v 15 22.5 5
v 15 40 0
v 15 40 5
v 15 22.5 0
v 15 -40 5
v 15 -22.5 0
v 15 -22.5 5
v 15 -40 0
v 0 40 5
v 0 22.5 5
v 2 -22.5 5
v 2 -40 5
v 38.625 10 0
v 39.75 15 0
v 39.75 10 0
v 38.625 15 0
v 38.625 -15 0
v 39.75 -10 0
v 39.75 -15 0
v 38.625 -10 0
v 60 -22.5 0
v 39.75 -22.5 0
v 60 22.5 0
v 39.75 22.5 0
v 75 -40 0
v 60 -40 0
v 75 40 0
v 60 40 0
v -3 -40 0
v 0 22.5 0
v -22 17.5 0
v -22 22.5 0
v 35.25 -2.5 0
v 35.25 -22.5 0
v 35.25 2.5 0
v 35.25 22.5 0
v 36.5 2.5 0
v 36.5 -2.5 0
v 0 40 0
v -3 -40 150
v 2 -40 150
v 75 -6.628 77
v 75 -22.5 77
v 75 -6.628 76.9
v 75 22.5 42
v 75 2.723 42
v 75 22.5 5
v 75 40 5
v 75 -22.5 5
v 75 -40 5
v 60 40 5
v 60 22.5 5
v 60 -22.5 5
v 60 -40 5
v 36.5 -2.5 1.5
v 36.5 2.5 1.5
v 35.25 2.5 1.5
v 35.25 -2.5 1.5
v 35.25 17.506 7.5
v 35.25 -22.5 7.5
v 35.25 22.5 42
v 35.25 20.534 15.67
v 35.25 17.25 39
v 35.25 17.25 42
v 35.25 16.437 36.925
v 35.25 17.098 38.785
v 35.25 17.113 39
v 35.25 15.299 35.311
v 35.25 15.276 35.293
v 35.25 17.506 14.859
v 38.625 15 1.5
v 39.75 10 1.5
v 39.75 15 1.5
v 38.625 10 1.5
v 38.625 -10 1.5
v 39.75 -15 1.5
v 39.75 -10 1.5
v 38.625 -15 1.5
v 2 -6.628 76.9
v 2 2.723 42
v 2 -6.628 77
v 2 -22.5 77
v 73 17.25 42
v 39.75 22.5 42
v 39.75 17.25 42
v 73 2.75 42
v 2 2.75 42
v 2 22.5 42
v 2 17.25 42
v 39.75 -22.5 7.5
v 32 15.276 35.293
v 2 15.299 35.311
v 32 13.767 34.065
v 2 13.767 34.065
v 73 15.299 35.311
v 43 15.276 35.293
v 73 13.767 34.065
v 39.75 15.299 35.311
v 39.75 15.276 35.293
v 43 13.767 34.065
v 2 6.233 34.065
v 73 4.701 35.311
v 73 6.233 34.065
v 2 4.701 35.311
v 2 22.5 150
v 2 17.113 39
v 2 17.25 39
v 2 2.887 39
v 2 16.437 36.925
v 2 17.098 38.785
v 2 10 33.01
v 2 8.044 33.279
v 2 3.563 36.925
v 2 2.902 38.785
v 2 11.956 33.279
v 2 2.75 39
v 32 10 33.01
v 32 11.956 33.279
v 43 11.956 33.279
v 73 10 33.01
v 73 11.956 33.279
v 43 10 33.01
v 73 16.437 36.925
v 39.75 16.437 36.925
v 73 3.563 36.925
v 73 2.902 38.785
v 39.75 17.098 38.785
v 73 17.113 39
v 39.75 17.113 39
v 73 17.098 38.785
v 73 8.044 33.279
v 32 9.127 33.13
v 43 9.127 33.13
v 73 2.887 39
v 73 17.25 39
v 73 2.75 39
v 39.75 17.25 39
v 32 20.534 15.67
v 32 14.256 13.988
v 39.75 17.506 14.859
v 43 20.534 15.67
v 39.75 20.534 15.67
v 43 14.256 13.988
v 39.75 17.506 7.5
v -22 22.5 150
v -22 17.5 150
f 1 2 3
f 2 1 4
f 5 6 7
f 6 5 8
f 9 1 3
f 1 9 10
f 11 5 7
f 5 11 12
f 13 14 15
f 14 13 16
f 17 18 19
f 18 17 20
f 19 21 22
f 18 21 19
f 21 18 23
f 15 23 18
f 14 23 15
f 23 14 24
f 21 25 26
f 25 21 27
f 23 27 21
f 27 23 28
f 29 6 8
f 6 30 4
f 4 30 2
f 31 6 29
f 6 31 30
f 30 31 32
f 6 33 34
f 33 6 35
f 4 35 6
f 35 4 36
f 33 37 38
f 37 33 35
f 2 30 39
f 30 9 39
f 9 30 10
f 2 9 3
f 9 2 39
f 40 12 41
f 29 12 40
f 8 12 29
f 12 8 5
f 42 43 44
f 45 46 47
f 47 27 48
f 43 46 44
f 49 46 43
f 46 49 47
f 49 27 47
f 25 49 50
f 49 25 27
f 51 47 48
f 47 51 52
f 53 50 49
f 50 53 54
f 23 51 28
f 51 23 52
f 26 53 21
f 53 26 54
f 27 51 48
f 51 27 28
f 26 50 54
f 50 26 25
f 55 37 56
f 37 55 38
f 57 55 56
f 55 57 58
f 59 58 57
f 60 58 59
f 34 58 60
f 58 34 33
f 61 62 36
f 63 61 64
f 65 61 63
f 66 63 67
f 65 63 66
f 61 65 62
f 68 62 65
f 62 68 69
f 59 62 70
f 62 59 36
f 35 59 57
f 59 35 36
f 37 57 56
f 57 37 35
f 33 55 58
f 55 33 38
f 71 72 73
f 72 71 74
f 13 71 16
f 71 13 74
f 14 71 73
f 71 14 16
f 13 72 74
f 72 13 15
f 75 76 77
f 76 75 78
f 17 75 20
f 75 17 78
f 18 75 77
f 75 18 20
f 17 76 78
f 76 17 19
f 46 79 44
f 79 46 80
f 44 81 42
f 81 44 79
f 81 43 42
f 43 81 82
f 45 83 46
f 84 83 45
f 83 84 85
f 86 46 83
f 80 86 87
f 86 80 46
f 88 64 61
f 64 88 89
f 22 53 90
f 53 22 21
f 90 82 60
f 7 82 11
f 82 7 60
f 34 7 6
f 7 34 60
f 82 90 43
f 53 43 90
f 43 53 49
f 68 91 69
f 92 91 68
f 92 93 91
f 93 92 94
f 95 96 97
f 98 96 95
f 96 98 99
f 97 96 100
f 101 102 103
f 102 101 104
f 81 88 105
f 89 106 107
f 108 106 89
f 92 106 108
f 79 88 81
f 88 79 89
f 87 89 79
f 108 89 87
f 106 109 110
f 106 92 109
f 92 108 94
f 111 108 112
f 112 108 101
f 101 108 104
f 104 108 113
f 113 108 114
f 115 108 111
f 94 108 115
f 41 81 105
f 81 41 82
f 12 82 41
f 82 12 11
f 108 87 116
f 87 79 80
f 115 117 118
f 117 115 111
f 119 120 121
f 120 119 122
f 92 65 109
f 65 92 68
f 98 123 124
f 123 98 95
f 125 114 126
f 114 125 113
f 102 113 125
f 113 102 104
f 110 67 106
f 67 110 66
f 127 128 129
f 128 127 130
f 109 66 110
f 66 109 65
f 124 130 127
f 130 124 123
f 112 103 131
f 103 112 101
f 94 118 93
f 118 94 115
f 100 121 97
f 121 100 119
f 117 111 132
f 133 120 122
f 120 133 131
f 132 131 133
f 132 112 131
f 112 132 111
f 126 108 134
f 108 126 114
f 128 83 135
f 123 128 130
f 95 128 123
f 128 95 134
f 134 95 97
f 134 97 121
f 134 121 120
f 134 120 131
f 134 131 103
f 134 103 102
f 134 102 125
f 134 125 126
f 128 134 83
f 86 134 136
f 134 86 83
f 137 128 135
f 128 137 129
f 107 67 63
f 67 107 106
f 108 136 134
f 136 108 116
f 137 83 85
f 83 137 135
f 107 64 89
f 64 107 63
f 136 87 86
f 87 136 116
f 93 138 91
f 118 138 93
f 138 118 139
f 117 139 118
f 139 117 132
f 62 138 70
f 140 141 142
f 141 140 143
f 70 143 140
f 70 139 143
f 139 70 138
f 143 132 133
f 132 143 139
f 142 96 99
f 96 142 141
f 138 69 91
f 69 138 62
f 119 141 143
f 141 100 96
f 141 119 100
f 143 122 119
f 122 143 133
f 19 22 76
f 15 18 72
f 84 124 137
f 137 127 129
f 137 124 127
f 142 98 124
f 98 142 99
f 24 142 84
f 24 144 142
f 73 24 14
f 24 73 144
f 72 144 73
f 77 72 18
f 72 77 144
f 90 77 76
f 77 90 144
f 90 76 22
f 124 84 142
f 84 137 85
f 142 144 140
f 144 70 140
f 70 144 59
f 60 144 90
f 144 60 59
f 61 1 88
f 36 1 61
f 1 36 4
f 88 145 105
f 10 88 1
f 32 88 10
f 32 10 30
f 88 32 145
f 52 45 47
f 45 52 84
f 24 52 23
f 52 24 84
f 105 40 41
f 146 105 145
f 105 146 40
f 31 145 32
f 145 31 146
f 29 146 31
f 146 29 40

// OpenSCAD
// include landscape mount
include_horizontal=1; // [0,1]

//width of phone connector
w_usb = 11;
//depth of phone connector
d_usb = 6.5;
//length of phone connector
l_usb=29;

//height of tilted back
h_back = 35;
//angle of tilt
th_back = 15; // [10:25]

//width of phone
w_phone = 71;

//depth of phone
d_phone = 14.5;

dock_offset=10;
d_mount = 45;
h_mount = 42;

//width of wire
w_wire = 4.5;
l_feet=80;

h_horiz=150;

// calculated values (do not edit)

w_mount = w_phone + 4;
pos_back = h_back/tan(90-th_back);
y_usb = sin(th_back)*l_usb;
z_usb = l_usb-cos(th_back)*l_usb;
//


feet();
wire_clips();
upper_back();

difference() {
translate([0,-d_mount/2,0]) cube([w_mount,d_mount,h_mount]);
translate([0,dock_offset,0]) {
dock_cutout();
wire_slot();
}
}

if (include_horizontal) {
horizontal_dock();
}


module wire_slot() {

//micro-usb cutout
translate([w_mount/2-w_usb/2,y_usb-d_usb/2,h_mount+z_usb-l_usb]) 
rotate([th_back,0,0]) cube([w_usb, d_usb,l_usb]);

//wire cutouts
translate([w_mount/2-w_wire/2,y_usb+sin(th_back)*(h_mount+10)/2,0]) 
rotate([th_back,0,0]) cube([w_wire, d_mount,h_mount+10]);

translate([w_mount/2-w_wire/2,y_usb,0]) cube([w_wire, d_mount,h_mount]);

translate([w_mount/2-w_wire/2,-d_mount/2-dock_offset,0]) cube([w_wire,d_mount,7.5]);
}


module dock_cutout() {
translate([0,0,-3]) {
translate([2,0,1.03*h_mount]) rotate([0,90,0]) cylinder(r=d_phone/2,h=w_phone);
translate([2,-d_phone/2,1*h_mount]) cube([w_phone,d_phone,d_phone]);
}
}

module wire_clips() {
translate([w_mount/2-w_wire/2,-2.5,0]) cube([1.25,5,1.5]);
translate([w_mount/2+w_wire/4,10,0]) cube([1.25,5,1.5]);
translate([w_mount/2+w_wire/4,-15,0]) cube([1.25,5,1.5]);
}


module upper_back() {

//triangular prism
translate([0,-d_phone/2-pos_back+dock_offset,h_mount-0.1])
rotate([90,0,90]) linear_extrude(height=w_mount) {
polygon(points=[[0,0],[0,h_back],[pos_back,0]],paths=[[0,1,2]],convexity=1);
}

// add a cube from back of mount to back of triangular prism
translate([0,-d_mount/2,h_mount]) cube([w_mount,(d_mount/2-pos_back-d_phone/2)+dock_offset,h_back]);
}


module feet() {
translate([0,-40,0]) cube([15,l_feet,5]);
translate([w_mount-15,-40,0]) cube([15,l_feet,5]);
}

module horizontal_dock() {

hull() {
translate([-24+2,d_mount/2-5,0]) cube([24,5,h_horiz]);
translate([-5+2,-l_feet/2,0]) cube([5,10,h_horiz]);
}
}
